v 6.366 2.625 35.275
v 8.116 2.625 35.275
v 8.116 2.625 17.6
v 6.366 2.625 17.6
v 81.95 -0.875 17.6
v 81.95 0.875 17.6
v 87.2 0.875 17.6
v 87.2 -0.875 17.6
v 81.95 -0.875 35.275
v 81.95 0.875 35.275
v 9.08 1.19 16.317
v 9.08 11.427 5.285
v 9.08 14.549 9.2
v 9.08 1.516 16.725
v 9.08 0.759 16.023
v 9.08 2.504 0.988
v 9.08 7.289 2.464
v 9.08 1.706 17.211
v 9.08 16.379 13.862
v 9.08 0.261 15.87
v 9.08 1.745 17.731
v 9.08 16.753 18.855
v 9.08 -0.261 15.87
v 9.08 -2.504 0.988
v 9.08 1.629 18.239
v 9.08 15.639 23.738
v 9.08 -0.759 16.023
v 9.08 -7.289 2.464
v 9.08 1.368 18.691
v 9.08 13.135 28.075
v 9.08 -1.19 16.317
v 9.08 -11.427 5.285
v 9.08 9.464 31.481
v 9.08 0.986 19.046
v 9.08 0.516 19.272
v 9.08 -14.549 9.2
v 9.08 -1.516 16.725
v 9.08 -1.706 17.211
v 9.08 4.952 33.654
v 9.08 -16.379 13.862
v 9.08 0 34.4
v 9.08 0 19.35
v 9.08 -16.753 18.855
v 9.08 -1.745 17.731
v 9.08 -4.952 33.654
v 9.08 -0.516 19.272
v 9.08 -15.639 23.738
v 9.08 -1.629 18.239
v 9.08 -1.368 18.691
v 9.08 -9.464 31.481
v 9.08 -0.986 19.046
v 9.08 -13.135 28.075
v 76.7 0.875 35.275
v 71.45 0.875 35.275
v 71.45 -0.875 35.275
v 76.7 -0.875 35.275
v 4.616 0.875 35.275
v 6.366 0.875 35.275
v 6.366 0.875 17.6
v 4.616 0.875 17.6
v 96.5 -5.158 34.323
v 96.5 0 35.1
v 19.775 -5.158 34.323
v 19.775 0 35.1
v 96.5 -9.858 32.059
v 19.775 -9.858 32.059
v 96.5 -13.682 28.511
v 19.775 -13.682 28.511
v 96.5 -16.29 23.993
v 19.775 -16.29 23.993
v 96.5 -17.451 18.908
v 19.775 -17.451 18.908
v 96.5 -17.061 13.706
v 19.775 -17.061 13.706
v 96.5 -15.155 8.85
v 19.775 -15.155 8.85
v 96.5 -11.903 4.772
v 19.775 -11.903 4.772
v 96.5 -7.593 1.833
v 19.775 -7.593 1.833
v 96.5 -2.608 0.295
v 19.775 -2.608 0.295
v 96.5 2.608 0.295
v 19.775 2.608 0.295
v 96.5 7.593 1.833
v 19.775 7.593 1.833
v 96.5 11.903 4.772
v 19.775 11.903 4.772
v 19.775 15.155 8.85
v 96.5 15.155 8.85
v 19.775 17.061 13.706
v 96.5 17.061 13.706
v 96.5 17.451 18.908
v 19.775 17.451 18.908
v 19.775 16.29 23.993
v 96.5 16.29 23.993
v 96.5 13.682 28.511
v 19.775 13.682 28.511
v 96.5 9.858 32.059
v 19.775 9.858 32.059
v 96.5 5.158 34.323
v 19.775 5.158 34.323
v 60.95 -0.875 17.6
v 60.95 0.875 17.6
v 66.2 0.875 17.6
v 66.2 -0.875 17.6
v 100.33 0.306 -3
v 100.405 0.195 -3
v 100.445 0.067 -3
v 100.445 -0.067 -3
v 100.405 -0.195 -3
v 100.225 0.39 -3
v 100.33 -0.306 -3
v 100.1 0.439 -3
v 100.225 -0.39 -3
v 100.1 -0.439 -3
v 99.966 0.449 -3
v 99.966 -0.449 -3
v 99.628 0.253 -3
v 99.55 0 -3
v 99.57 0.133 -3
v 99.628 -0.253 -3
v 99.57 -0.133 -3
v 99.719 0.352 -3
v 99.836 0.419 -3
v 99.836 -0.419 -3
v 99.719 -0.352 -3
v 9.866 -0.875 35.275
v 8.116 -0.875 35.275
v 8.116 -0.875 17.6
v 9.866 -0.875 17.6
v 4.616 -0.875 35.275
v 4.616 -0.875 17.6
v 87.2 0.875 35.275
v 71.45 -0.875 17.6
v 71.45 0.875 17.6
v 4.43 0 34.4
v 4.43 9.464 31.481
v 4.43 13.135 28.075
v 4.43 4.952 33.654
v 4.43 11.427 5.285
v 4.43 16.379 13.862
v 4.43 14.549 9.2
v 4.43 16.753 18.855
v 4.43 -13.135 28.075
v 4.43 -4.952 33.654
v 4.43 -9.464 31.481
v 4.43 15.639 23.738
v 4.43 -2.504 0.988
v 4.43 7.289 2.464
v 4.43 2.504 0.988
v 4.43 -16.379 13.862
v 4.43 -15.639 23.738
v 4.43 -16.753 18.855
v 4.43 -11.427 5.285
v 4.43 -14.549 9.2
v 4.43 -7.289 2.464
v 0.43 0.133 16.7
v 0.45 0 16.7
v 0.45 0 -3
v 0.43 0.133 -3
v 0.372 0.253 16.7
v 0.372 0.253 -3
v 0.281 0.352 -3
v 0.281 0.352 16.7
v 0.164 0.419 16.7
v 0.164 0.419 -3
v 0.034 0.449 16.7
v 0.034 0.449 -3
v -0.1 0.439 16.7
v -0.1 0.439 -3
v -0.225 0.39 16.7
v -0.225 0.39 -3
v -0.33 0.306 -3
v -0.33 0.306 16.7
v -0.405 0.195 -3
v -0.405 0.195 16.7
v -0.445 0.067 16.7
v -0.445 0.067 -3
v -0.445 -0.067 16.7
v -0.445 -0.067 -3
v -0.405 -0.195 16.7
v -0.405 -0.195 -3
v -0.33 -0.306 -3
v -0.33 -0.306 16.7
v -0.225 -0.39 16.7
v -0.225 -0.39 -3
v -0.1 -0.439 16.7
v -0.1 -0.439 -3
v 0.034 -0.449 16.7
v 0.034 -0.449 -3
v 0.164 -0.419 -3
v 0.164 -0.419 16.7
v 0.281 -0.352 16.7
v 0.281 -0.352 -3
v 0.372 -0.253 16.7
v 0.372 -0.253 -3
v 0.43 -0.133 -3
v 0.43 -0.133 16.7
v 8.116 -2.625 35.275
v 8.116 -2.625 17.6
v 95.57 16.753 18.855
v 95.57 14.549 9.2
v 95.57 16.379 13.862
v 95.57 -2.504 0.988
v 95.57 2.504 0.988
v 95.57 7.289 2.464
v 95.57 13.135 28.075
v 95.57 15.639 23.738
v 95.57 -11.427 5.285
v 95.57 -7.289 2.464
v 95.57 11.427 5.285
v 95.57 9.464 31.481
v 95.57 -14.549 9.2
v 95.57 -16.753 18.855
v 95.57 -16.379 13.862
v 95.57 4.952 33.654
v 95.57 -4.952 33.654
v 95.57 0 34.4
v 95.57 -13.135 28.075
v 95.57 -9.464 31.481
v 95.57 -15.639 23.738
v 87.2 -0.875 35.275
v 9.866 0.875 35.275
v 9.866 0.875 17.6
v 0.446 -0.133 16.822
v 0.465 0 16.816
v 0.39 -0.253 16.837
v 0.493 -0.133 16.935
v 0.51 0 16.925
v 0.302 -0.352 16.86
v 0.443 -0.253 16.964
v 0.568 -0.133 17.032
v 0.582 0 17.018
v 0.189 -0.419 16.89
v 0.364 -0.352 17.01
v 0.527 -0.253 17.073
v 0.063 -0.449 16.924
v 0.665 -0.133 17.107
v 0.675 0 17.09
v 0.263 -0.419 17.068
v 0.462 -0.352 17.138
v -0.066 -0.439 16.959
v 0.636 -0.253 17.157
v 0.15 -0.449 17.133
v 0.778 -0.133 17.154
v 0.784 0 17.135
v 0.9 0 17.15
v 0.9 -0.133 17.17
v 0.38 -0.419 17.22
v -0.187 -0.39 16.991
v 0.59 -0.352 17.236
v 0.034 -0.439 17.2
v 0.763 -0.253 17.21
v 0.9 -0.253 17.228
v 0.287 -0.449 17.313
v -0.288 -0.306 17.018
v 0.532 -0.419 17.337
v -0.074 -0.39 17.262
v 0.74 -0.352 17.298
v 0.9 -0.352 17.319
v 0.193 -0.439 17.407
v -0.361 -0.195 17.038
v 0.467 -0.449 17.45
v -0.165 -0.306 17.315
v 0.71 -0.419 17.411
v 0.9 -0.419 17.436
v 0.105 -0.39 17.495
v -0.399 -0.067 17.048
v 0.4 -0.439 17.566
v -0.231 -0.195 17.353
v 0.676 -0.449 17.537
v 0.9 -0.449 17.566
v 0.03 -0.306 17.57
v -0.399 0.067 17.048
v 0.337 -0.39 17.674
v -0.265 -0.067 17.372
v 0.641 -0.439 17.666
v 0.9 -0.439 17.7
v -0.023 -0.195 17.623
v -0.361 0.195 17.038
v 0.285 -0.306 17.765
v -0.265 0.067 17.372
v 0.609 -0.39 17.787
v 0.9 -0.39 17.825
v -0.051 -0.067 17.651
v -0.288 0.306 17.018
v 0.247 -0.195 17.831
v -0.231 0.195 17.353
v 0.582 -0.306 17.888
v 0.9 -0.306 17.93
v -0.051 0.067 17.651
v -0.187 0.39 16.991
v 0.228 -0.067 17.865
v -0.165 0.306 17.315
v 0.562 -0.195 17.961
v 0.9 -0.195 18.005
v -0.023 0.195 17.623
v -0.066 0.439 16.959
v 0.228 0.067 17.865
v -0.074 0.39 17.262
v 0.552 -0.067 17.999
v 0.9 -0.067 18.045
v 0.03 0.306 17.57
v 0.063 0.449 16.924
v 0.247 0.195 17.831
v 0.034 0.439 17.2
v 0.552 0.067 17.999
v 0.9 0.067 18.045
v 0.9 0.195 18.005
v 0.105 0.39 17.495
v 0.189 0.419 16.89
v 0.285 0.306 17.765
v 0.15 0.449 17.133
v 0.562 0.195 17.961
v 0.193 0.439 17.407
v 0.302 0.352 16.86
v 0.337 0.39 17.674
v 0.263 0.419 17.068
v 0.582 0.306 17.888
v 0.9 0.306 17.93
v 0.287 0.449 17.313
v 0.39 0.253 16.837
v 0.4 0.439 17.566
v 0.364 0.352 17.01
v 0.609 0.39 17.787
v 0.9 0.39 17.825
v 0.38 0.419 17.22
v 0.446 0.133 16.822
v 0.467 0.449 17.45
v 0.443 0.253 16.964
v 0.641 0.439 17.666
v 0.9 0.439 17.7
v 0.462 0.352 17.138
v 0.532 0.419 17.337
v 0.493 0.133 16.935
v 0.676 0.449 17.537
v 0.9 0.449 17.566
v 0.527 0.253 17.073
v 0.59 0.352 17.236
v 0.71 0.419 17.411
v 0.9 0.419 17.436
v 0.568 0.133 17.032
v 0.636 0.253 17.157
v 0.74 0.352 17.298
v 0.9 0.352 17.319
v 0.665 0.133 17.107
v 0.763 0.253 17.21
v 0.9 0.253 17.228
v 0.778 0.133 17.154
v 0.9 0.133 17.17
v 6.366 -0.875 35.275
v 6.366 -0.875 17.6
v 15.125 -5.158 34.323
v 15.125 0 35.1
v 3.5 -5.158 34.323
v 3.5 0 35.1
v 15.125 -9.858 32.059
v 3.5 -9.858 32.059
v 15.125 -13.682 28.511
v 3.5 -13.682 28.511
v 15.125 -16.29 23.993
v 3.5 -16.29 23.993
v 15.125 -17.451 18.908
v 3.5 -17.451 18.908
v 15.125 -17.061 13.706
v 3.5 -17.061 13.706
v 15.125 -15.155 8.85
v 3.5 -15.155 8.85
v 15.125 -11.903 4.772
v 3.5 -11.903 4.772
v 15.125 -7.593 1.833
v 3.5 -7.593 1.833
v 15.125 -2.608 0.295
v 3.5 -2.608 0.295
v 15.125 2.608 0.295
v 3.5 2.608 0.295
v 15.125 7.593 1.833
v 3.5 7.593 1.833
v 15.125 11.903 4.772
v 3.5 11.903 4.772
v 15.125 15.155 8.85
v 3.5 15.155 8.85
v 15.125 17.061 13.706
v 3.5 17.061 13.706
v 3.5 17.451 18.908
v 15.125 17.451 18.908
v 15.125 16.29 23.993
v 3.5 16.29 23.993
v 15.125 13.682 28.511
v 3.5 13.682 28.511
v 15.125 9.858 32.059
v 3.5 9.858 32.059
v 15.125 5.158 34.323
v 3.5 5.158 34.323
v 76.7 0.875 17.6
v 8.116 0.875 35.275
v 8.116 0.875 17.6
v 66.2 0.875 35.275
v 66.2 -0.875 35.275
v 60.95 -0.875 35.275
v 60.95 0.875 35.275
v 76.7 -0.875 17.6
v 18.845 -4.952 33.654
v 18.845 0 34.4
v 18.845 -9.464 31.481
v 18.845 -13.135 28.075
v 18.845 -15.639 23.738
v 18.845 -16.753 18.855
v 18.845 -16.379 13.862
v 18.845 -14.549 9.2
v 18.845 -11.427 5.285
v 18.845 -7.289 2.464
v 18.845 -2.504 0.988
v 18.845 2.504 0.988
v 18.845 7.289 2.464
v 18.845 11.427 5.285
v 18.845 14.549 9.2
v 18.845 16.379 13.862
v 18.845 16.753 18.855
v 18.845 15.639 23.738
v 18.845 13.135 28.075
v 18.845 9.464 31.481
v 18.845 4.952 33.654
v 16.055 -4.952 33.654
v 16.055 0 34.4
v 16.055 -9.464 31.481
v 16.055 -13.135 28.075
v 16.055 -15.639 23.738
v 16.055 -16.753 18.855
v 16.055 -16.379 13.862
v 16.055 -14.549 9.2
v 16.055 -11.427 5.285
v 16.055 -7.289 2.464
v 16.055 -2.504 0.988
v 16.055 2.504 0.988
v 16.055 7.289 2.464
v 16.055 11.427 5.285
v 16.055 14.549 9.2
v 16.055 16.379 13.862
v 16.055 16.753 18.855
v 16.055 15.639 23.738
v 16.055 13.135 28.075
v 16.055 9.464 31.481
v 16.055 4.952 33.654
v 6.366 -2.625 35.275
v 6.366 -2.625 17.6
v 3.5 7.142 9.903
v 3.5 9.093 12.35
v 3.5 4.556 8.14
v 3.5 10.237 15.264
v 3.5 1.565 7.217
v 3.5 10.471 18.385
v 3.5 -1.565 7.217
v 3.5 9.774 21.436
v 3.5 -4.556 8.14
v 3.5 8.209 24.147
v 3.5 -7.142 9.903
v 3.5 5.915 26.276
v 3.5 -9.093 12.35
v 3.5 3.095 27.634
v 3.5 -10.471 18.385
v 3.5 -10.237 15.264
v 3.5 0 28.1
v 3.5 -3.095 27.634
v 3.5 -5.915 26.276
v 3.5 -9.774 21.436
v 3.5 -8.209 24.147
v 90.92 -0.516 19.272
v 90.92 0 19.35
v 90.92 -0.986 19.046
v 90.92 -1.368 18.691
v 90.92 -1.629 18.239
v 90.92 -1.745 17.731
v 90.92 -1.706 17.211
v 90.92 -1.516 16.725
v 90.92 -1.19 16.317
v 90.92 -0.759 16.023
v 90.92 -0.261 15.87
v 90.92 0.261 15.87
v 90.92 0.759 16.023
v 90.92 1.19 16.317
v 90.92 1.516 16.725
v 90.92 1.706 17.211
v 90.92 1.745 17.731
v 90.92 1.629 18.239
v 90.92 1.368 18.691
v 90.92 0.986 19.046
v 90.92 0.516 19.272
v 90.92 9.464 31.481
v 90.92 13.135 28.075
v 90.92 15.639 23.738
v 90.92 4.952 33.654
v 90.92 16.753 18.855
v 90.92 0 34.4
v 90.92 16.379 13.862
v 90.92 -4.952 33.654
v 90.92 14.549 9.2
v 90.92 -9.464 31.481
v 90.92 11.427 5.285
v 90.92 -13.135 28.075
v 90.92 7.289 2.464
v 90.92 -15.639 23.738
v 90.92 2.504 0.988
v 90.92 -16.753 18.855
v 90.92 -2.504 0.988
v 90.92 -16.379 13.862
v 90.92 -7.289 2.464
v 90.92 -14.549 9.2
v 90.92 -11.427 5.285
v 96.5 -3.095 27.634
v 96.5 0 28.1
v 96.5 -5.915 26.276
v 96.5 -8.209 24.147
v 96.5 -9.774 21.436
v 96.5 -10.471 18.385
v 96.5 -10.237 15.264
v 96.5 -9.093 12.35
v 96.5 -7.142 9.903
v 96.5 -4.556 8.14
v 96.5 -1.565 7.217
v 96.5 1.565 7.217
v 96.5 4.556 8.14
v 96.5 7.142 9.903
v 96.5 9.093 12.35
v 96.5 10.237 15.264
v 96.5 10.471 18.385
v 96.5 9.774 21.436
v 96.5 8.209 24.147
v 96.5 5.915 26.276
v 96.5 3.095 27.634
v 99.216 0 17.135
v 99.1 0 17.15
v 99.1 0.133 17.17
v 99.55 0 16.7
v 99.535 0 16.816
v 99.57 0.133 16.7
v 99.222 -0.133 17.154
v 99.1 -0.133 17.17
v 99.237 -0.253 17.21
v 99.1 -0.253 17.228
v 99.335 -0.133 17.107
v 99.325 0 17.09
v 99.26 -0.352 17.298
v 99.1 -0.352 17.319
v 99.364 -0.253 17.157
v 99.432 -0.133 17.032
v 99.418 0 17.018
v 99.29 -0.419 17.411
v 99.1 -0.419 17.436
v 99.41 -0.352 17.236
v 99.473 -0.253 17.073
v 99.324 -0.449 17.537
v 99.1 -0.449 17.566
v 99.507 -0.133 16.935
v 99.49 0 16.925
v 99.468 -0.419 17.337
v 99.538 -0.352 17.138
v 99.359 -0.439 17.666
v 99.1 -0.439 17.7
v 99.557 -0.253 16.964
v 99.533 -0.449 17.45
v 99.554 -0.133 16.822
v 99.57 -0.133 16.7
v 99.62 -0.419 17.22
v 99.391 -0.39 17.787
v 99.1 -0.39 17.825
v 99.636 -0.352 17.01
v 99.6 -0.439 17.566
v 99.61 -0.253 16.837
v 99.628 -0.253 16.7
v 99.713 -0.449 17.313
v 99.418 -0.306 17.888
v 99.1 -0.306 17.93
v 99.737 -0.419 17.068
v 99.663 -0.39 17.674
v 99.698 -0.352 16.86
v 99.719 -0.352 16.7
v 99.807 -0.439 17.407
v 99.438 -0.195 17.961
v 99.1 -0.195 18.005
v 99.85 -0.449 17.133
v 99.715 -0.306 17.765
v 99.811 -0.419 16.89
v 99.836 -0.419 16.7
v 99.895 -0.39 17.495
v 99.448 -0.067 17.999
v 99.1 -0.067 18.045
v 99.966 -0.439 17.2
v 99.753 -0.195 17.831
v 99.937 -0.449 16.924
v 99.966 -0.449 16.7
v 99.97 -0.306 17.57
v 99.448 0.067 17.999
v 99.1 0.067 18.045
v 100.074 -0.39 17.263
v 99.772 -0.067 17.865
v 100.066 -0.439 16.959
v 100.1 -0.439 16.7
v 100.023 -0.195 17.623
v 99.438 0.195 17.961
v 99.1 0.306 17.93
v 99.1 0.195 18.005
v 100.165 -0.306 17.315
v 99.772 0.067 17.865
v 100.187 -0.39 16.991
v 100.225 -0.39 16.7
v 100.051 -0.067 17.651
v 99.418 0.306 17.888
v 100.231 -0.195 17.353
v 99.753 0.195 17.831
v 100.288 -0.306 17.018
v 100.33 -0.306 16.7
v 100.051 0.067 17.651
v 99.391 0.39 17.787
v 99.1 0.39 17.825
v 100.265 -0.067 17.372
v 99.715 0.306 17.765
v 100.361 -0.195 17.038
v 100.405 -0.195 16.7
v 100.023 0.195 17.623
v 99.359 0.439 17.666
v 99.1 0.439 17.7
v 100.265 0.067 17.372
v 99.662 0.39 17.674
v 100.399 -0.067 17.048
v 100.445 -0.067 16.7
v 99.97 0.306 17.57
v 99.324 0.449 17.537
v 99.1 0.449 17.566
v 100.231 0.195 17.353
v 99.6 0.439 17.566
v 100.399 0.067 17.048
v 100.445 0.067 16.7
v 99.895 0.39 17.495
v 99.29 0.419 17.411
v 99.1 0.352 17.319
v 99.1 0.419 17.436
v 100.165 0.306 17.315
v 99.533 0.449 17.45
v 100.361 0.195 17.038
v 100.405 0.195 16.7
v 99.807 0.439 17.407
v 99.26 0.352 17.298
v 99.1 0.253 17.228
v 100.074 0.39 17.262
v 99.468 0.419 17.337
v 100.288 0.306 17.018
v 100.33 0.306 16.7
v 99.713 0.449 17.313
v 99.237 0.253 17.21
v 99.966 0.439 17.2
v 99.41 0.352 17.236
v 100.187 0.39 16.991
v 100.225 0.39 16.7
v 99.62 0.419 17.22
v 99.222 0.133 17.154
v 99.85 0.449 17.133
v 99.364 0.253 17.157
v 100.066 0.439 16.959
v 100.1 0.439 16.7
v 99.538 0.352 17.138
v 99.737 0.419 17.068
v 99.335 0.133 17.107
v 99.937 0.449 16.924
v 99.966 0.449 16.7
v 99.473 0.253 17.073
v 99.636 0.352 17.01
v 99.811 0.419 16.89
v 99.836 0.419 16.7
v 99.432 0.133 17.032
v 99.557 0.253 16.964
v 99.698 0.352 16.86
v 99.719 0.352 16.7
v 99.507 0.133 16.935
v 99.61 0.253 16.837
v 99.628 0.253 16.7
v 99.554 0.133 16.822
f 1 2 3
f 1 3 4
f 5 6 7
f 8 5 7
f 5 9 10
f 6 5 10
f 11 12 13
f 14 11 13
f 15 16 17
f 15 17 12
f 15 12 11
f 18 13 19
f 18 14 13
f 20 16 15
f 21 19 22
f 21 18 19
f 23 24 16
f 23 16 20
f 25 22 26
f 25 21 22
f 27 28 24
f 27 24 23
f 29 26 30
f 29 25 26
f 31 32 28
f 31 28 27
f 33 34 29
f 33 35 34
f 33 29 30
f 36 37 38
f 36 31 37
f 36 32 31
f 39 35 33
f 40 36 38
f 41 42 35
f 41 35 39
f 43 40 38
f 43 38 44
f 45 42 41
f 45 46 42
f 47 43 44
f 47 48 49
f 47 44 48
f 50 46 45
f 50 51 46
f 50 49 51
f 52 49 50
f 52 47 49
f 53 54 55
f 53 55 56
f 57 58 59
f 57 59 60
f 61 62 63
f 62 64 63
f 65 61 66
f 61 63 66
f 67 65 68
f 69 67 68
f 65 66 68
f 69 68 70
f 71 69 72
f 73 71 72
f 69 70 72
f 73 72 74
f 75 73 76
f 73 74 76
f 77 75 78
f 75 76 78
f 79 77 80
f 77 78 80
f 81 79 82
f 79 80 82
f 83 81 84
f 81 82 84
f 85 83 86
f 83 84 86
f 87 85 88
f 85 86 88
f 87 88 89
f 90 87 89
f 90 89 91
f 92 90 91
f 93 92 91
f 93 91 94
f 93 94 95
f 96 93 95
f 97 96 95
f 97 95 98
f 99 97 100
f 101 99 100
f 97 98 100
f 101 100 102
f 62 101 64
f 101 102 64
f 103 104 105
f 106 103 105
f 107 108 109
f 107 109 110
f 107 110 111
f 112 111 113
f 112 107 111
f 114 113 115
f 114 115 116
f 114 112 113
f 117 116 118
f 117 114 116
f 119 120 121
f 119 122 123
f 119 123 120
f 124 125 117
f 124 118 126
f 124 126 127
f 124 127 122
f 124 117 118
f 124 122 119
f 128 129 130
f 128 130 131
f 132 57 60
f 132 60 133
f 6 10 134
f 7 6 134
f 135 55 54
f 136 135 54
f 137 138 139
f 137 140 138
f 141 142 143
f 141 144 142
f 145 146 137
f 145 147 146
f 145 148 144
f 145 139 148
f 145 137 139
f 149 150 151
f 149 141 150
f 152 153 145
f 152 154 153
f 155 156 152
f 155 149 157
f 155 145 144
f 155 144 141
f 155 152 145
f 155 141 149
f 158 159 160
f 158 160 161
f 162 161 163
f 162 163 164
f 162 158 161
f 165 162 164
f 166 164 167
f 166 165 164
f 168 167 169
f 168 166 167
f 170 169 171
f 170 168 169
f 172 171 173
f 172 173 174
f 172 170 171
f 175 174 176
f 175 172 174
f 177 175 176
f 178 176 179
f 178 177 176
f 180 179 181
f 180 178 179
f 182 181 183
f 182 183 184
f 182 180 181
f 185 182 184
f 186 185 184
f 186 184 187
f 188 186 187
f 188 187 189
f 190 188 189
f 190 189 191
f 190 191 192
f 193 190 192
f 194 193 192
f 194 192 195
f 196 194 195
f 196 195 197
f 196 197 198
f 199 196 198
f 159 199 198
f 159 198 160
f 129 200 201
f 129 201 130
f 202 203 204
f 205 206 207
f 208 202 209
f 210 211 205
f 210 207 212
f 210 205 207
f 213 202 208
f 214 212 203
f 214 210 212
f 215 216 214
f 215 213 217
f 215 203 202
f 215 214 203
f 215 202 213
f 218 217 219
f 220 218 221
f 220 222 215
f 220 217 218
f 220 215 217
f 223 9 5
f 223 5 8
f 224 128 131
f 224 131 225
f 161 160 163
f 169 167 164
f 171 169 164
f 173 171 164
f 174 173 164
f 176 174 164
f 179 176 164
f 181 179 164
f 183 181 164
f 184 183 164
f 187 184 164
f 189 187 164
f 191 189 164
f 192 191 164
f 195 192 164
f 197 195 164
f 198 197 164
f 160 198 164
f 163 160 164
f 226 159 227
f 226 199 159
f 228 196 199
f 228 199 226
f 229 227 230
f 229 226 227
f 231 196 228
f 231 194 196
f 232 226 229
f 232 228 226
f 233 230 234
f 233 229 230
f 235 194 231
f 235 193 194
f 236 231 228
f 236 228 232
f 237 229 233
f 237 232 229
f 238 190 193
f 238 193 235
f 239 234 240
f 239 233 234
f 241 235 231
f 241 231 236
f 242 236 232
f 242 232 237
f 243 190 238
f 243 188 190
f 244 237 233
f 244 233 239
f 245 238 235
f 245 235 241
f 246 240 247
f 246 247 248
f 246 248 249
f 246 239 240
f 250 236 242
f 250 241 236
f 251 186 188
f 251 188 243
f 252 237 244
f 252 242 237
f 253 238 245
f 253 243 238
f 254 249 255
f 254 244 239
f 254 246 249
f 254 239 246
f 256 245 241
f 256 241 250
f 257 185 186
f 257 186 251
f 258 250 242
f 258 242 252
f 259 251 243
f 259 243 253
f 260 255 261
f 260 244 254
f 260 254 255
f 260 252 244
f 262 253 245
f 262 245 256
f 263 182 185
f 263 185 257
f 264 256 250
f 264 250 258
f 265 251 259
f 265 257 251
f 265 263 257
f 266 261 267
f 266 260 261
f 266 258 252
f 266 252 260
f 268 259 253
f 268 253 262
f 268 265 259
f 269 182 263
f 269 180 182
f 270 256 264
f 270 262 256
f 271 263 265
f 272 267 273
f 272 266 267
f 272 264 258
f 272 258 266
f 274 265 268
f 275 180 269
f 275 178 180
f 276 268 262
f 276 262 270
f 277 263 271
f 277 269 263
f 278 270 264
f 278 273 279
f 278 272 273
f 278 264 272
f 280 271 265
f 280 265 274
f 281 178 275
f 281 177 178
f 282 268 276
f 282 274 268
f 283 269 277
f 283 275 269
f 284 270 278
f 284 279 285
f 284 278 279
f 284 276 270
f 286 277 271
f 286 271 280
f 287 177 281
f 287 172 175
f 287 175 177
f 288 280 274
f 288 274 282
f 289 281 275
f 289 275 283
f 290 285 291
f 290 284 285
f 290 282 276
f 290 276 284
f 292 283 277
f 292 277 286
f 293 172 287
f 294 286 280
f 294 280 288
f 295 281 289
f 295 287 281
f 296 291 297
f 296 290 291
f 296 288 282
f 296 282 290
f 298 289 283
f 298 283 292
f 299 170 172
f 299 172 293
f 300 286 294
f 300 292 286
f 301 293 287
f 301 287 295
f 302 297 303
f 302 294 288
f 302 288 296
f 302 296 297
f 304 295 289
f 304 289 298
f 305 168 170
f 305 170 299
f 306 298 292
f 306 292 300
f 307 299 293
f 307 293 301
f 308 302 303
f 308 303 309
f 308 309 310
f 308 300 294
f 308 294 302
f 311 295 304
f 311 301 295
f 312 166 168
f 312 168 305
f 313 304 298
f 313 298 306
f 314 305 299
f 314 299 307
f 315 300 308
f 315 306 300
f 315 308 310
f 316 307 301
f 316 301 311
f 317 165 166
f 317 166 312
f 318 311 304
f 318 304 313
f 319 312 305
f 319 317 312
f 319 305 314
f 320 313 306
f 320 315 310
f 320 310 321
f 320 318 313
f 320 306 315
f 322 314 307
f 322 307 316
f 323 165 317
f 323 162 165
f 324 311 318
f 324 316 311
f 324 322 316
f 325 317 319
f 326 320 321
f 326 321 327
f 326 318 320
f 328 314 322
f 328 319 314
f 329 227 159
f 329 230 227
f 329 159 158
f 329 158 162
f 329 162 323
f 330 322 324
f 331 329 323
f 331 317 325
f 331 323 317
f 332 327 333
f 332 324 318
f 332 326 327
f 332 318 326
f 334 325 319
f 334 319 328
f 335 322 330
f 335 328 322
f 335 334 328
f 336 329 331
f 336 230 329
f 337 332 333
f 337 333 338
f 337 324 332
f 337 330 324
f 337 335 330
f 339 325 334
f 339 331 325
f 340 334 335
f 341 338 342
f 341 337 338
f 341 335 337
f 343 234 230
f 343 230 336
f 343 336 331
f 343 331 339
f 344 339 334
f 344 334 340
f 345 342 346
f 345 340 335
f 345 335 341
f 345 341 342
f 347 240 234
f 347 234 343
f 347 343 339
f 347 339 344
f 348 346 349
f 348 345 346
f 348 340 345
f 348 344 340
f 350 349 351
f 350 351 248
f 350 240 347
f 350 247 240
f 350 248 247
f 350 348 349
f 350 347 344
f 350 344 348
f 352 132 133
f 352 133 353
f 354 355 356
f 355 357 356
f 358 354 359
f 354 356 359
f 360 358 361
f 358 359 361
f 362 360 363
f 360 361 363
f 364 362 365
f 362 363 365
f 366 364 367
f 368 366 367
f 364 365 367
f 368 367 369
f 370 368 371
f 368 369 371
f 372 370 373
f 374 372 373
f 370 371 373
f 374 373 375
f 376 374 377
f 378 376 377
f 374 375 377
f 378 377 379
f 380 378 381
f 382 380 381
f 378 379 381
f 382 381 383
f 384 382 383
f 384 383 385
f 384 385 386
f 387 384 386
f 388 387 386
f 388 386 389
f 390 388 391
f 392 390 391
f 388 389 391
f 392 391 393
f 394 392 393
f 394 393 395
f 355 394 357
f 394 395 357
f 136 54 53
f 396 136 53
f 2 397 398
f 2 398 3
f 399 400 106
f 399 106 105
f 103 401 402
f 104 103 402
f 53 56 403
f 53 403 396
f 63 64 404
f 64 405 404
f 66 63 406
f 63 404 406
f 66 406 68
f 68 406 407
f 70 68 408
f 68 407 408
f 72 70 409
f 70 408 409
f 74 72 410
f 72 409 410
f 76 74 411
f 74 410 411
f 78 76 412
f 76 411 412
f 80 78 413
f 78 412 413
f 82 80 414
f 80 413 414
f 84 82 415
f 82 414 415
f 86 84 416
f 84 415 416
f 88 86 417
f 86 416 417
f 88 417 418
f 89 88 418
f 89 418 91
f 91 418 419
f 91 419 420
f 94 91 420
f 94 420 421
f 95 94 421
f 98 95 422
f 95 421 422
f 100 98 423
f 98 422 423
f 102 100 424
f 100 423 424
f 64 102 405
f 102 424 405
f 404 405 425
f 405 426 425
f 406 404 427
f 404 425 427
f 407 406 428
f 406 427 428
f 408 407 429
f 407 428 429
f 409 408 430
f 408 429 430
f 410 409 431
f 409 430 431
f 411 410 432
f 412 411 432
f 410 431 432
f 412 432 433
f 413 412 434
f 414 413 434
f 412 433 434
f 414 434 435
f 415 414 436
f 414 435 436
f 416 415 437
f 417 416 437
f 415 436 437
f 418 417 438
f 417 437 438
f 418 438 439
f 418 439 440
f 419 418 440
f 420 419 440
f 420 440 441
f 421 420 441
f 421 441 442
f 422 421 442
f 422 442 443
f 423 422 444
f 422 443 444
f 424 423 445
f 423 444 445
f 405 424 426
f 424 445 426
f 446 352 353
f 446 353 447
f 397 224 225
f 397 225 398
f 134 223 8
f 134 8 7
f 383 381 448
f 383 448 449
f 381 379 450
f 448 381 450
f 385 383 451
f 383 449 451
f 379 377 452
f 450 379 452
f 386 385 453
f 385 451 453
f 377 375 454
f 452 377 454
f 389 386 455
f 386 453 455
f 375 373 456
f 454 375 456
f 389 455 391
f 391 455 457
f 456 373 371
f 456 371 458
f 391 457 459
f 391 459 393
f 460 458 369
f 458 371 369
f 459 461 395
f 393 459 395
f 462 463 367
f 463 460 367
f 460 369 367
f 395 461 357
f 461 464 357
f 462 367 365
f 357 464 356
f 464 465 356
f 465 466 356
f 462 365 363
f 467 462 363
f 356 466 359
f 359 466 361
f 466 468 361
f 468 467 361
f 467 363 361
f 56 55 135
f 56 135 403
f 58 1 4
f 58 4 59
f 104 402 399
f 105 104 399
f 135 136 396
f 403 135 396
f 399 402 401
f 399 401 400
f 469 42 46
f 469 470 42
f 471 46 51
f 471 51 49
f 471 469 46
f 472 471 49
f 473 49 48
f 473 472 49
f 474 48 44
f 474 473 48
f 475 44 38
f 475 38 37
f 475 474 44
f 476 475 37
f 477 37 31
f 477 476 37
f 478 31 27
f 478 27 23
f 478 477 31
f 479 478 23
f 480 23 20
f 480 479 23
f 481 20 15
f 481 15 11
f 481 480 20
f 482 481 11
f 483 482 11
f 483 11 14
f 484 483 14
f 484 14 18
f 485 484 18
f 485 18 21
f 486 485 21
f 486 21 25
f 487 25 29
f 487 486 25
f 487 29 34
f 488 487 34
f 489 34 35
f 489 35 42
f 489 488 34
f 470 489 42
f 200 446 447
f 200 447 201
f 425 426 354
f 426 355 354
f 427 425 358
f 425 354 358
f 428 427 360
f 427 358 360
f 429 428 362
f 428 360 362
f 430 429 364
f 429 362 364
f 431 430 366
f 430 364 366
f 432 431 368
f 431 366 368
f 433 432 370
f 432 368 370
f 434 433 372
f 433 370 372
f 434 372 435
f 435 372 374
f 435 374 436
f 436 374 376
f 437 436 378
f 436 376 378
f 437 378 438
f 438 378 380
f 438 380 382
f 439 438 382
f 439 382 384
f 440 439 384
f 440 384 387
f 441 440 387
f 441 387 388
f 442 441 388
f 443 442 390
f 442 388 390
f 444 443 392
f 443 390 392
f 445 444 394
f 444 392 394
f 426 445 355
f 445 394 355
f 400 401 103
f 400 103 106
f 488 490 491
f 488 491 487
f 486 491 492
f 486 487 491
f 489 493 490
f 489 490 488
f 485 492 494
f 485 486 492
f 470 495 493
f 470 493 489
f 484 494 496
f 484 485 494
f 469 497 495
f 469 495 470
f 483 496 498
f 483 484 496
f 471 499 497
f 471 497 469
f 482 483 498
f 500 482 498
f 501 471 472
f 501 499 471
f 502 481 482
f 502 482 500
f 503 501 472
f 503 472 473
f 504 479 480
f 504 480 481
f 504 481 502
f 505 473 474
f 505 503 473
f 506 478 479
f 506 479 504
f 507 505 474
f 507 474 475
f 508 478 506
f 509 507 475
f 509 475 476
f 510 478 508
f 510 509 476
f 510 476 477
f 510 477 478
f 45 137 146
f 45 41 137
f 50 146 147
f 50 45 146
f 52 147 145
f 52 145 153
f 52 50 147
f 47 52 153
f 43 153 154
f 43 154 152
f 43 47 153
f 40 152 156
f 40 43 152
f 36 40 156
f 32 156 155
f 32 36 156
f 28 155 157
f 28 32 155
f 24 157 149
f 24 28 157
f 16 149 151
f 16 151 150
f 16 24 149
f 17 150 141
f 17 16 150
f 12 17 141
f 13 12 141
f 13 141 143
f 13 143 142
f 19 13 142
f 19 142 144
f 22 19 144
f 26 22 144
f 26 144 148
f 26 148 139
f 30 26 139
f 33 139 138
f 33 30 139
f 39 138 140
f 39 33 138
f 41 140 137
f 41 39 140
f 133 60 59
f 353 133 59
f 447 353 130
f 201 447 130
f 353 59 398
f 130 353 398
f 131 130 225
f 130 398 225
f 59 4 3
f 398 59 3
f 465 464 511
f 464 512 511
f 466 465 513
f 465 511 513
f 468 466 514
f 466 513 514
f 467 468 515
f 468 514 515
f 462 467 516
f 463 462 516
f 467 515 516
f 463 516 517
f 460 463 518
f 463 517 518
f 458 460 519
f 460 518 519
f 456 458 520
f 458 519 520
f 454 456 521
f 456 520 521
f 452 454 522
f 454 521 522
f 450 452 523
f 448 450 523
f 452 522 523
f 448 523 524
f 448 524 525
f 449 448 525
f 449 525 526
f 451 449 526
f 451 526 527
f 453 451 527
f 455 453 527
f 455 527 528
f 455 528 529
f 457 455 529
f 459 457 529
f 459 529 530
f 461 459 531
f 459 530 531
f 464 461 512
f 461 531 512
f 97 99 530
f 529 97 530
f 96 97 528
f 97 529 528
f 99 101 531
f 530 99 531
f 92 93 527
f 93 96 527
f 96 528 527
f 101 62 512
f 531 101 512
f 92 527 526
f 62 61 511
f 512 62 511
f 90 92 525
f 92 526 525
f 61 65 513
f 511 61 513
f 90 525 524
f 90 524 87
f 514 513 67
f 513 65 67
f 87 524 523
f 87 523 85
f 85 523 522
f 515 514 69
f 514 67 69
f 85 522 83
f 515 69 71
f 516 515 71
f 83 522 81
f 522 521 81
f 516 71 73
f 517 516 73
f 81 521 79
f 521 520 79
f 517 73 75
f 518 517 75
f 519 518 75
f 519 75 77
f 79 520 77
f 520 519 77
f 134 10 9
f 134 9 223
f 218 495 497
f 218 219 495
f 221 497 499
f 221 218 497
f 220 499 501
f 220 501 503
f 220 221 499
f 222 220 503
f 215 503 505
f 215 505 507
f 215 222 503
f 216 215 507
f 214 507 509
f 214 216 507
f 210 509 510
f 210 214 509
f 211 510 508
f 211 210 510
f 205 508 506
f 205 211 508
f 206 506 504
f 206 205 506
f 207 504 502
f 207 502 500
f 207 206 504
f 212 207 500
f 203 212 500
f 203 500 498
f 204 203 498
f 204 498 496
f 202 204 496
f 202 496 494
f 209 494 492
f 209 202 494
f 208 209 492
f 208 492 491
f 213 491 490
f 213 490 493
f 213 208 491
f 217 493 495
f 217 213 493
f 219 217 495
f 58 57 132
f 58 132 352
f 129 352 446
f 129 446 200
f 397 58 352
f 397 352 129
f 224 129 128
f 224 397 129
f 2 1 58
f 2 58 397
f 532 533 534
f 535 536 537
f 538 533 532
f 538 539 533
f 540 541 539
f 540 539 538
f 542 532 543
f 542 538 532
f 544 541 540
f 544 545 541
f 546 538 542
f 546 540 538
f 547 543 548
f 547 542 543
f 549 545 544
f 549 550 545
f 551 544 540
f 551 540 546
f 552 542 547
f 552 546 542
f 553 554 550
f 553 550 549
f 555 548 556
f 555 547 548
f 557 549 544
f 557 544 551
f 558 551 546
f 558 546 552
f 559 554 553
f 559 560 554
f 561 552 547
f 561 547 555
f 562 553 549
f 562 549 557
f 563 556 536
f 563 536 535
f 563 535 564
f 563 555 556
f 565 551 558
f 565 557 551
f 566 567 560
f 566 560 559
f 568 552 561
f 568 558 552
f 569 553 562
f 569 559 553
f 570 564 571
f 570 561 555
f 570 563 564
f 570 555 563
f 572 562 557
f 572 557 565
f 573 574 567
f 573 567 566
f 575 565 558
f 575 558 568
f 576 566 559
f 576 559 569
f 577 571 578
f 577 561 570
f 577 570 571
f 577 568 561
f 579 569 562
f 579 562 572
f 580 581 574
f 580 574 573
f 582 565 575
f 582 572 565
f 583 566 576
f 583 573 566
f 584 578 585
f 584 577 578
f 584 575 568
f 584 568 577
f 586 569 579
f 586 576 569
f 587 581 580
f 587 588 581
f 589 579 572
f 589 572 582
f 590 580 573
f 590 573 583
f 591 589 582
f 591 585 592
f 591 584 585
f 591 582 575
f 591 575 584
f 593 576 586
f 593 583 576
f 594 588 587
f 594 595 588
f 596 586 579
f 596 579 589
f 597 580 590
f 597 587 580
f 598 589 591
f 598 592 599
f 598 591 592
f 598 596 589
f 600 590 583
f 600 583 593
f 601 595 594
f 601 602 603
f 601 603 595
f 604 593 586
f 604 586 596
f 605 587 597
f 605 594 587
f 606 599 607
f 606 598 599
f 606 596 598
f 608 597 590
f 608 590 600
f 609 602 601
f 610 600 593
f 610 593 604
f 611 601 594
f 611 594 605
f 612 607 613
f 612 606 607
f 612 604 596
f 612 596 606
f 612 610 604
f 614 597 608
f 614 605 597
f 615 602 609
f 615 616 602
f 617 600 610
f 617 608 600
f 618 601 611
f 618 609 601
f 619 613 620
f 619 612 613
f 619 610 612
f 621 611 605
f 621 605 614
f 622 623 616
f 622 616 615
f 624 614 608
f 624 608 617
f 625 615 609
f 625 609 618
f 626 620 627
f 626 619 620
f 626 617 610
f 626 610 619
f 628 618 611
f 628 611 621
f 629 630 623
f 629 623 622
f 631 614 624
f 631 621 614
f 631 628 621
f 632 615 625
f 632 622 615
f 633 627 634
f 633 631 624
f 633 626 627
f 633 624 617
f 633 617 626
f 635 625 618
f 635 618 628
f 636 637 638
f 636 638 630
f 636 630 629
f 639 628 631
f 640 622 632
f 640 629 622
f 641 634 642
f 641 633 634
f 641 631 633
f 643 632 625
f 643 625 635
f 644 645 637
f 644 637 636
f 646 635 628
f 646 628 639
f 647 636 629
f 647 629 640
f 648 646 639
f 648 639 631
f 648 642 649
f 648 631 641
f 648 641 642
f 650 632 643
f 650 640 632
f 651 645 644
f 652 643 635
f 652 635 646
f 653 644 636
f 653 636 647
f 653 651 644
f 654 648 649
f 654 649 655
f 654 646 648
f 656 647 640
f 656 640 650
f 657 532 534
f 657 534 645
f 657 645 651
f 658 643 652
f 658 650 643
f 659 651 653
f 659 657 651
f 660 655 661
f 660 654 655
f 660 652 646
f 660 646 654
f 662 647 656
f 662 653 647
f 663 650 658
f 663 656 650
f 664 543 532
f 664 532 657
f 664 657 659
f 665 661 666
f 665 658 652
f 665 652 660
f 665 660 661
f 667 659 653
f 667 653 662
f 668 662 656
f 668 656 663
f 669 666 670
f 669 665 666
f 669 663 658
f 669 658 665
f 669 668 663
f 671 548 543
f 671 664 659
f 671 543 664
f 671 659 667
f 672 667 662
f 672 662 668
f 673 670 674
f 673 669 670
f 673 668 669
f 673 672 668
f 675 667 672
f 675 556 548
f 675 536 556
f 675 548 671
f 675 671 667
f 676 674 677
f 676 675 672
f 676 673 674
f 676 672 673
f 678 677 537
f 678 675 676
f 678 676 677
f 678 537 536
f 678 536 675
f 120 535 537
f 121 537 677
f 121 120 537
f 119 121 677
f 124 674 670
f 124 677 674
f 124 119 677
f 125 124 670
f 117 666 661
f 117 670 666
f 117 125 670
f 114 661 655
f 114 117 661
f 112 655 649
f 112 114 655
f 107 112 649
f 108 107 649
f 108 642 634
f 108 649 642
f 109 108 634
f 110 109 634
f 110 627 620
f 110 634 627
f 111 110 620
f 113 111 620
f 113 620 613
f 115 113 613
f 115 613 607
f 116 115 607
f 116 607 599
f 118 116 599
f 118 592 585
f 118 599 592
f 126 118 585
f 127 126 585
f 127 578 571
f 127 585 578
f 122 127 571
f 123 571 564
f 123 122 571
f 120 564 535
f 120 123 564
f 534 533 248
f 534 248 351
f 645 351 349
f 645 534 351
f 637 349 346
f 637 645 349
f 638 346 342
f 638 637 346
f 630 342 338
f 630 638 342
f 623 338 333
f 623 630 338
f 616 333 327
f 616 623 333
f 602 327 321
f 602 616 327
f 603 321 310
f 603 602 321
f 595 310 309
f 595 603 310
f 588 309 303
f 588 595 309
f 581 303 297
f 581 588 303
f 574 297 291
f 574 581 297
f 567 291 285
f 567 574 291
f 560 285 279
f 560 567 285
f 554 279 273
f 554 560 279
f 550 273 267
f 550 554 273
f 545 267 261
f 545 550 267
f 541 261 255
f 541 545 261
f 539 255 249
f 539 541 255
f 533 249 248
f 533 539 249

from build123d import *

# Parameters (mm, degrees)
SKETCH_R    = 0.45
SKETCH004_W = 5.25
SKETCH004_H = 1.75
PAD_DEPTH   = 17.675


with BuildPart() as sweep_body:
    # Sweep: sweep along a path in Sketch001
    with BuildLine(Plane.XZ) as sweep_path:
        Line((0, -3), (0, 16.7))
        ThreePointArc((0, 16.7), (0.263601, 17.336393), (0.899993, 17.6))
        Line((0.899993, 17.6), (99.1, 17.6))
        ThreePointArc((99.1, 17.6), (99.736396, 17.336396), (100, 16.7))
        Line((100, 16.7), (100, -3))
    # Sketch → Sweep (sweep)
    with BuildSketch(Plane.XY.offset(-2)):
        Circle(SKETCH_R)
    sweep(path=sweep_path.line)


with BuildPart() as revolution:
    # Sketch002 → Revolution (revolve)
    with BuildSketch(Plane.XZ):
        Polygon((3.5, 35.1), (3.5, 28.1), (96.5, 28.1), (96.5, 35.1), (19.775, 35.1), (18.845, 34.4), (16.055, 34.4), (15.125, 35.1), align=None)
    revolve(axis=Axis((6.97588, 0, 17.6), (1, 0, 0)))


with BuildPart() as revolution001:
    # Sketch003 → Revolution001 (revolve)
    with BuildSketch(Plane.XZ):
        Polygon((4.43, 34.4), (9.08, 34.4), (9.08, 19.35), (90.92, 19.35), (90.92, 34.4), (95.57, 34.4), (95.57, 17.6), (4.43, 17.6), align=None)
    revolve(axis=Axis((6.97588, 0, 17.6), (1, 0, 0)))


with BuildPart() as pad:
    # Sketch004 → Pad (new body)
    with BuildSketch(Plane.XY.offset(17.6)):
        with Locations((84.575, 0)):
            Rectangle(SKETCH004_W, SKETCH004_H)
        with Locations((74.075, 0)):
            Rectangle(SKETCH004_W, SKETCH004_H)
        with Locations((63.575, 0)):
            Rectangle(SKETCH004_W, SKETCH004_H)
        Polygon((6.366, 0.875), (4.616, 0.875), (4.616, -0.875), (6.366, -0.875), (6.366, -2.625), (8.116, -2.625), (8.116, -0.875), (9.866, -0.875), (9.866, 0.875), (8.116, 0.875), (8.116, 2.625), (6.366, 2.625), align=None)
    extrude(amount=PAD_DEPTH)


solid = Compound([sweep_body.part, revolution.part, revolution001.part, pad.part])
